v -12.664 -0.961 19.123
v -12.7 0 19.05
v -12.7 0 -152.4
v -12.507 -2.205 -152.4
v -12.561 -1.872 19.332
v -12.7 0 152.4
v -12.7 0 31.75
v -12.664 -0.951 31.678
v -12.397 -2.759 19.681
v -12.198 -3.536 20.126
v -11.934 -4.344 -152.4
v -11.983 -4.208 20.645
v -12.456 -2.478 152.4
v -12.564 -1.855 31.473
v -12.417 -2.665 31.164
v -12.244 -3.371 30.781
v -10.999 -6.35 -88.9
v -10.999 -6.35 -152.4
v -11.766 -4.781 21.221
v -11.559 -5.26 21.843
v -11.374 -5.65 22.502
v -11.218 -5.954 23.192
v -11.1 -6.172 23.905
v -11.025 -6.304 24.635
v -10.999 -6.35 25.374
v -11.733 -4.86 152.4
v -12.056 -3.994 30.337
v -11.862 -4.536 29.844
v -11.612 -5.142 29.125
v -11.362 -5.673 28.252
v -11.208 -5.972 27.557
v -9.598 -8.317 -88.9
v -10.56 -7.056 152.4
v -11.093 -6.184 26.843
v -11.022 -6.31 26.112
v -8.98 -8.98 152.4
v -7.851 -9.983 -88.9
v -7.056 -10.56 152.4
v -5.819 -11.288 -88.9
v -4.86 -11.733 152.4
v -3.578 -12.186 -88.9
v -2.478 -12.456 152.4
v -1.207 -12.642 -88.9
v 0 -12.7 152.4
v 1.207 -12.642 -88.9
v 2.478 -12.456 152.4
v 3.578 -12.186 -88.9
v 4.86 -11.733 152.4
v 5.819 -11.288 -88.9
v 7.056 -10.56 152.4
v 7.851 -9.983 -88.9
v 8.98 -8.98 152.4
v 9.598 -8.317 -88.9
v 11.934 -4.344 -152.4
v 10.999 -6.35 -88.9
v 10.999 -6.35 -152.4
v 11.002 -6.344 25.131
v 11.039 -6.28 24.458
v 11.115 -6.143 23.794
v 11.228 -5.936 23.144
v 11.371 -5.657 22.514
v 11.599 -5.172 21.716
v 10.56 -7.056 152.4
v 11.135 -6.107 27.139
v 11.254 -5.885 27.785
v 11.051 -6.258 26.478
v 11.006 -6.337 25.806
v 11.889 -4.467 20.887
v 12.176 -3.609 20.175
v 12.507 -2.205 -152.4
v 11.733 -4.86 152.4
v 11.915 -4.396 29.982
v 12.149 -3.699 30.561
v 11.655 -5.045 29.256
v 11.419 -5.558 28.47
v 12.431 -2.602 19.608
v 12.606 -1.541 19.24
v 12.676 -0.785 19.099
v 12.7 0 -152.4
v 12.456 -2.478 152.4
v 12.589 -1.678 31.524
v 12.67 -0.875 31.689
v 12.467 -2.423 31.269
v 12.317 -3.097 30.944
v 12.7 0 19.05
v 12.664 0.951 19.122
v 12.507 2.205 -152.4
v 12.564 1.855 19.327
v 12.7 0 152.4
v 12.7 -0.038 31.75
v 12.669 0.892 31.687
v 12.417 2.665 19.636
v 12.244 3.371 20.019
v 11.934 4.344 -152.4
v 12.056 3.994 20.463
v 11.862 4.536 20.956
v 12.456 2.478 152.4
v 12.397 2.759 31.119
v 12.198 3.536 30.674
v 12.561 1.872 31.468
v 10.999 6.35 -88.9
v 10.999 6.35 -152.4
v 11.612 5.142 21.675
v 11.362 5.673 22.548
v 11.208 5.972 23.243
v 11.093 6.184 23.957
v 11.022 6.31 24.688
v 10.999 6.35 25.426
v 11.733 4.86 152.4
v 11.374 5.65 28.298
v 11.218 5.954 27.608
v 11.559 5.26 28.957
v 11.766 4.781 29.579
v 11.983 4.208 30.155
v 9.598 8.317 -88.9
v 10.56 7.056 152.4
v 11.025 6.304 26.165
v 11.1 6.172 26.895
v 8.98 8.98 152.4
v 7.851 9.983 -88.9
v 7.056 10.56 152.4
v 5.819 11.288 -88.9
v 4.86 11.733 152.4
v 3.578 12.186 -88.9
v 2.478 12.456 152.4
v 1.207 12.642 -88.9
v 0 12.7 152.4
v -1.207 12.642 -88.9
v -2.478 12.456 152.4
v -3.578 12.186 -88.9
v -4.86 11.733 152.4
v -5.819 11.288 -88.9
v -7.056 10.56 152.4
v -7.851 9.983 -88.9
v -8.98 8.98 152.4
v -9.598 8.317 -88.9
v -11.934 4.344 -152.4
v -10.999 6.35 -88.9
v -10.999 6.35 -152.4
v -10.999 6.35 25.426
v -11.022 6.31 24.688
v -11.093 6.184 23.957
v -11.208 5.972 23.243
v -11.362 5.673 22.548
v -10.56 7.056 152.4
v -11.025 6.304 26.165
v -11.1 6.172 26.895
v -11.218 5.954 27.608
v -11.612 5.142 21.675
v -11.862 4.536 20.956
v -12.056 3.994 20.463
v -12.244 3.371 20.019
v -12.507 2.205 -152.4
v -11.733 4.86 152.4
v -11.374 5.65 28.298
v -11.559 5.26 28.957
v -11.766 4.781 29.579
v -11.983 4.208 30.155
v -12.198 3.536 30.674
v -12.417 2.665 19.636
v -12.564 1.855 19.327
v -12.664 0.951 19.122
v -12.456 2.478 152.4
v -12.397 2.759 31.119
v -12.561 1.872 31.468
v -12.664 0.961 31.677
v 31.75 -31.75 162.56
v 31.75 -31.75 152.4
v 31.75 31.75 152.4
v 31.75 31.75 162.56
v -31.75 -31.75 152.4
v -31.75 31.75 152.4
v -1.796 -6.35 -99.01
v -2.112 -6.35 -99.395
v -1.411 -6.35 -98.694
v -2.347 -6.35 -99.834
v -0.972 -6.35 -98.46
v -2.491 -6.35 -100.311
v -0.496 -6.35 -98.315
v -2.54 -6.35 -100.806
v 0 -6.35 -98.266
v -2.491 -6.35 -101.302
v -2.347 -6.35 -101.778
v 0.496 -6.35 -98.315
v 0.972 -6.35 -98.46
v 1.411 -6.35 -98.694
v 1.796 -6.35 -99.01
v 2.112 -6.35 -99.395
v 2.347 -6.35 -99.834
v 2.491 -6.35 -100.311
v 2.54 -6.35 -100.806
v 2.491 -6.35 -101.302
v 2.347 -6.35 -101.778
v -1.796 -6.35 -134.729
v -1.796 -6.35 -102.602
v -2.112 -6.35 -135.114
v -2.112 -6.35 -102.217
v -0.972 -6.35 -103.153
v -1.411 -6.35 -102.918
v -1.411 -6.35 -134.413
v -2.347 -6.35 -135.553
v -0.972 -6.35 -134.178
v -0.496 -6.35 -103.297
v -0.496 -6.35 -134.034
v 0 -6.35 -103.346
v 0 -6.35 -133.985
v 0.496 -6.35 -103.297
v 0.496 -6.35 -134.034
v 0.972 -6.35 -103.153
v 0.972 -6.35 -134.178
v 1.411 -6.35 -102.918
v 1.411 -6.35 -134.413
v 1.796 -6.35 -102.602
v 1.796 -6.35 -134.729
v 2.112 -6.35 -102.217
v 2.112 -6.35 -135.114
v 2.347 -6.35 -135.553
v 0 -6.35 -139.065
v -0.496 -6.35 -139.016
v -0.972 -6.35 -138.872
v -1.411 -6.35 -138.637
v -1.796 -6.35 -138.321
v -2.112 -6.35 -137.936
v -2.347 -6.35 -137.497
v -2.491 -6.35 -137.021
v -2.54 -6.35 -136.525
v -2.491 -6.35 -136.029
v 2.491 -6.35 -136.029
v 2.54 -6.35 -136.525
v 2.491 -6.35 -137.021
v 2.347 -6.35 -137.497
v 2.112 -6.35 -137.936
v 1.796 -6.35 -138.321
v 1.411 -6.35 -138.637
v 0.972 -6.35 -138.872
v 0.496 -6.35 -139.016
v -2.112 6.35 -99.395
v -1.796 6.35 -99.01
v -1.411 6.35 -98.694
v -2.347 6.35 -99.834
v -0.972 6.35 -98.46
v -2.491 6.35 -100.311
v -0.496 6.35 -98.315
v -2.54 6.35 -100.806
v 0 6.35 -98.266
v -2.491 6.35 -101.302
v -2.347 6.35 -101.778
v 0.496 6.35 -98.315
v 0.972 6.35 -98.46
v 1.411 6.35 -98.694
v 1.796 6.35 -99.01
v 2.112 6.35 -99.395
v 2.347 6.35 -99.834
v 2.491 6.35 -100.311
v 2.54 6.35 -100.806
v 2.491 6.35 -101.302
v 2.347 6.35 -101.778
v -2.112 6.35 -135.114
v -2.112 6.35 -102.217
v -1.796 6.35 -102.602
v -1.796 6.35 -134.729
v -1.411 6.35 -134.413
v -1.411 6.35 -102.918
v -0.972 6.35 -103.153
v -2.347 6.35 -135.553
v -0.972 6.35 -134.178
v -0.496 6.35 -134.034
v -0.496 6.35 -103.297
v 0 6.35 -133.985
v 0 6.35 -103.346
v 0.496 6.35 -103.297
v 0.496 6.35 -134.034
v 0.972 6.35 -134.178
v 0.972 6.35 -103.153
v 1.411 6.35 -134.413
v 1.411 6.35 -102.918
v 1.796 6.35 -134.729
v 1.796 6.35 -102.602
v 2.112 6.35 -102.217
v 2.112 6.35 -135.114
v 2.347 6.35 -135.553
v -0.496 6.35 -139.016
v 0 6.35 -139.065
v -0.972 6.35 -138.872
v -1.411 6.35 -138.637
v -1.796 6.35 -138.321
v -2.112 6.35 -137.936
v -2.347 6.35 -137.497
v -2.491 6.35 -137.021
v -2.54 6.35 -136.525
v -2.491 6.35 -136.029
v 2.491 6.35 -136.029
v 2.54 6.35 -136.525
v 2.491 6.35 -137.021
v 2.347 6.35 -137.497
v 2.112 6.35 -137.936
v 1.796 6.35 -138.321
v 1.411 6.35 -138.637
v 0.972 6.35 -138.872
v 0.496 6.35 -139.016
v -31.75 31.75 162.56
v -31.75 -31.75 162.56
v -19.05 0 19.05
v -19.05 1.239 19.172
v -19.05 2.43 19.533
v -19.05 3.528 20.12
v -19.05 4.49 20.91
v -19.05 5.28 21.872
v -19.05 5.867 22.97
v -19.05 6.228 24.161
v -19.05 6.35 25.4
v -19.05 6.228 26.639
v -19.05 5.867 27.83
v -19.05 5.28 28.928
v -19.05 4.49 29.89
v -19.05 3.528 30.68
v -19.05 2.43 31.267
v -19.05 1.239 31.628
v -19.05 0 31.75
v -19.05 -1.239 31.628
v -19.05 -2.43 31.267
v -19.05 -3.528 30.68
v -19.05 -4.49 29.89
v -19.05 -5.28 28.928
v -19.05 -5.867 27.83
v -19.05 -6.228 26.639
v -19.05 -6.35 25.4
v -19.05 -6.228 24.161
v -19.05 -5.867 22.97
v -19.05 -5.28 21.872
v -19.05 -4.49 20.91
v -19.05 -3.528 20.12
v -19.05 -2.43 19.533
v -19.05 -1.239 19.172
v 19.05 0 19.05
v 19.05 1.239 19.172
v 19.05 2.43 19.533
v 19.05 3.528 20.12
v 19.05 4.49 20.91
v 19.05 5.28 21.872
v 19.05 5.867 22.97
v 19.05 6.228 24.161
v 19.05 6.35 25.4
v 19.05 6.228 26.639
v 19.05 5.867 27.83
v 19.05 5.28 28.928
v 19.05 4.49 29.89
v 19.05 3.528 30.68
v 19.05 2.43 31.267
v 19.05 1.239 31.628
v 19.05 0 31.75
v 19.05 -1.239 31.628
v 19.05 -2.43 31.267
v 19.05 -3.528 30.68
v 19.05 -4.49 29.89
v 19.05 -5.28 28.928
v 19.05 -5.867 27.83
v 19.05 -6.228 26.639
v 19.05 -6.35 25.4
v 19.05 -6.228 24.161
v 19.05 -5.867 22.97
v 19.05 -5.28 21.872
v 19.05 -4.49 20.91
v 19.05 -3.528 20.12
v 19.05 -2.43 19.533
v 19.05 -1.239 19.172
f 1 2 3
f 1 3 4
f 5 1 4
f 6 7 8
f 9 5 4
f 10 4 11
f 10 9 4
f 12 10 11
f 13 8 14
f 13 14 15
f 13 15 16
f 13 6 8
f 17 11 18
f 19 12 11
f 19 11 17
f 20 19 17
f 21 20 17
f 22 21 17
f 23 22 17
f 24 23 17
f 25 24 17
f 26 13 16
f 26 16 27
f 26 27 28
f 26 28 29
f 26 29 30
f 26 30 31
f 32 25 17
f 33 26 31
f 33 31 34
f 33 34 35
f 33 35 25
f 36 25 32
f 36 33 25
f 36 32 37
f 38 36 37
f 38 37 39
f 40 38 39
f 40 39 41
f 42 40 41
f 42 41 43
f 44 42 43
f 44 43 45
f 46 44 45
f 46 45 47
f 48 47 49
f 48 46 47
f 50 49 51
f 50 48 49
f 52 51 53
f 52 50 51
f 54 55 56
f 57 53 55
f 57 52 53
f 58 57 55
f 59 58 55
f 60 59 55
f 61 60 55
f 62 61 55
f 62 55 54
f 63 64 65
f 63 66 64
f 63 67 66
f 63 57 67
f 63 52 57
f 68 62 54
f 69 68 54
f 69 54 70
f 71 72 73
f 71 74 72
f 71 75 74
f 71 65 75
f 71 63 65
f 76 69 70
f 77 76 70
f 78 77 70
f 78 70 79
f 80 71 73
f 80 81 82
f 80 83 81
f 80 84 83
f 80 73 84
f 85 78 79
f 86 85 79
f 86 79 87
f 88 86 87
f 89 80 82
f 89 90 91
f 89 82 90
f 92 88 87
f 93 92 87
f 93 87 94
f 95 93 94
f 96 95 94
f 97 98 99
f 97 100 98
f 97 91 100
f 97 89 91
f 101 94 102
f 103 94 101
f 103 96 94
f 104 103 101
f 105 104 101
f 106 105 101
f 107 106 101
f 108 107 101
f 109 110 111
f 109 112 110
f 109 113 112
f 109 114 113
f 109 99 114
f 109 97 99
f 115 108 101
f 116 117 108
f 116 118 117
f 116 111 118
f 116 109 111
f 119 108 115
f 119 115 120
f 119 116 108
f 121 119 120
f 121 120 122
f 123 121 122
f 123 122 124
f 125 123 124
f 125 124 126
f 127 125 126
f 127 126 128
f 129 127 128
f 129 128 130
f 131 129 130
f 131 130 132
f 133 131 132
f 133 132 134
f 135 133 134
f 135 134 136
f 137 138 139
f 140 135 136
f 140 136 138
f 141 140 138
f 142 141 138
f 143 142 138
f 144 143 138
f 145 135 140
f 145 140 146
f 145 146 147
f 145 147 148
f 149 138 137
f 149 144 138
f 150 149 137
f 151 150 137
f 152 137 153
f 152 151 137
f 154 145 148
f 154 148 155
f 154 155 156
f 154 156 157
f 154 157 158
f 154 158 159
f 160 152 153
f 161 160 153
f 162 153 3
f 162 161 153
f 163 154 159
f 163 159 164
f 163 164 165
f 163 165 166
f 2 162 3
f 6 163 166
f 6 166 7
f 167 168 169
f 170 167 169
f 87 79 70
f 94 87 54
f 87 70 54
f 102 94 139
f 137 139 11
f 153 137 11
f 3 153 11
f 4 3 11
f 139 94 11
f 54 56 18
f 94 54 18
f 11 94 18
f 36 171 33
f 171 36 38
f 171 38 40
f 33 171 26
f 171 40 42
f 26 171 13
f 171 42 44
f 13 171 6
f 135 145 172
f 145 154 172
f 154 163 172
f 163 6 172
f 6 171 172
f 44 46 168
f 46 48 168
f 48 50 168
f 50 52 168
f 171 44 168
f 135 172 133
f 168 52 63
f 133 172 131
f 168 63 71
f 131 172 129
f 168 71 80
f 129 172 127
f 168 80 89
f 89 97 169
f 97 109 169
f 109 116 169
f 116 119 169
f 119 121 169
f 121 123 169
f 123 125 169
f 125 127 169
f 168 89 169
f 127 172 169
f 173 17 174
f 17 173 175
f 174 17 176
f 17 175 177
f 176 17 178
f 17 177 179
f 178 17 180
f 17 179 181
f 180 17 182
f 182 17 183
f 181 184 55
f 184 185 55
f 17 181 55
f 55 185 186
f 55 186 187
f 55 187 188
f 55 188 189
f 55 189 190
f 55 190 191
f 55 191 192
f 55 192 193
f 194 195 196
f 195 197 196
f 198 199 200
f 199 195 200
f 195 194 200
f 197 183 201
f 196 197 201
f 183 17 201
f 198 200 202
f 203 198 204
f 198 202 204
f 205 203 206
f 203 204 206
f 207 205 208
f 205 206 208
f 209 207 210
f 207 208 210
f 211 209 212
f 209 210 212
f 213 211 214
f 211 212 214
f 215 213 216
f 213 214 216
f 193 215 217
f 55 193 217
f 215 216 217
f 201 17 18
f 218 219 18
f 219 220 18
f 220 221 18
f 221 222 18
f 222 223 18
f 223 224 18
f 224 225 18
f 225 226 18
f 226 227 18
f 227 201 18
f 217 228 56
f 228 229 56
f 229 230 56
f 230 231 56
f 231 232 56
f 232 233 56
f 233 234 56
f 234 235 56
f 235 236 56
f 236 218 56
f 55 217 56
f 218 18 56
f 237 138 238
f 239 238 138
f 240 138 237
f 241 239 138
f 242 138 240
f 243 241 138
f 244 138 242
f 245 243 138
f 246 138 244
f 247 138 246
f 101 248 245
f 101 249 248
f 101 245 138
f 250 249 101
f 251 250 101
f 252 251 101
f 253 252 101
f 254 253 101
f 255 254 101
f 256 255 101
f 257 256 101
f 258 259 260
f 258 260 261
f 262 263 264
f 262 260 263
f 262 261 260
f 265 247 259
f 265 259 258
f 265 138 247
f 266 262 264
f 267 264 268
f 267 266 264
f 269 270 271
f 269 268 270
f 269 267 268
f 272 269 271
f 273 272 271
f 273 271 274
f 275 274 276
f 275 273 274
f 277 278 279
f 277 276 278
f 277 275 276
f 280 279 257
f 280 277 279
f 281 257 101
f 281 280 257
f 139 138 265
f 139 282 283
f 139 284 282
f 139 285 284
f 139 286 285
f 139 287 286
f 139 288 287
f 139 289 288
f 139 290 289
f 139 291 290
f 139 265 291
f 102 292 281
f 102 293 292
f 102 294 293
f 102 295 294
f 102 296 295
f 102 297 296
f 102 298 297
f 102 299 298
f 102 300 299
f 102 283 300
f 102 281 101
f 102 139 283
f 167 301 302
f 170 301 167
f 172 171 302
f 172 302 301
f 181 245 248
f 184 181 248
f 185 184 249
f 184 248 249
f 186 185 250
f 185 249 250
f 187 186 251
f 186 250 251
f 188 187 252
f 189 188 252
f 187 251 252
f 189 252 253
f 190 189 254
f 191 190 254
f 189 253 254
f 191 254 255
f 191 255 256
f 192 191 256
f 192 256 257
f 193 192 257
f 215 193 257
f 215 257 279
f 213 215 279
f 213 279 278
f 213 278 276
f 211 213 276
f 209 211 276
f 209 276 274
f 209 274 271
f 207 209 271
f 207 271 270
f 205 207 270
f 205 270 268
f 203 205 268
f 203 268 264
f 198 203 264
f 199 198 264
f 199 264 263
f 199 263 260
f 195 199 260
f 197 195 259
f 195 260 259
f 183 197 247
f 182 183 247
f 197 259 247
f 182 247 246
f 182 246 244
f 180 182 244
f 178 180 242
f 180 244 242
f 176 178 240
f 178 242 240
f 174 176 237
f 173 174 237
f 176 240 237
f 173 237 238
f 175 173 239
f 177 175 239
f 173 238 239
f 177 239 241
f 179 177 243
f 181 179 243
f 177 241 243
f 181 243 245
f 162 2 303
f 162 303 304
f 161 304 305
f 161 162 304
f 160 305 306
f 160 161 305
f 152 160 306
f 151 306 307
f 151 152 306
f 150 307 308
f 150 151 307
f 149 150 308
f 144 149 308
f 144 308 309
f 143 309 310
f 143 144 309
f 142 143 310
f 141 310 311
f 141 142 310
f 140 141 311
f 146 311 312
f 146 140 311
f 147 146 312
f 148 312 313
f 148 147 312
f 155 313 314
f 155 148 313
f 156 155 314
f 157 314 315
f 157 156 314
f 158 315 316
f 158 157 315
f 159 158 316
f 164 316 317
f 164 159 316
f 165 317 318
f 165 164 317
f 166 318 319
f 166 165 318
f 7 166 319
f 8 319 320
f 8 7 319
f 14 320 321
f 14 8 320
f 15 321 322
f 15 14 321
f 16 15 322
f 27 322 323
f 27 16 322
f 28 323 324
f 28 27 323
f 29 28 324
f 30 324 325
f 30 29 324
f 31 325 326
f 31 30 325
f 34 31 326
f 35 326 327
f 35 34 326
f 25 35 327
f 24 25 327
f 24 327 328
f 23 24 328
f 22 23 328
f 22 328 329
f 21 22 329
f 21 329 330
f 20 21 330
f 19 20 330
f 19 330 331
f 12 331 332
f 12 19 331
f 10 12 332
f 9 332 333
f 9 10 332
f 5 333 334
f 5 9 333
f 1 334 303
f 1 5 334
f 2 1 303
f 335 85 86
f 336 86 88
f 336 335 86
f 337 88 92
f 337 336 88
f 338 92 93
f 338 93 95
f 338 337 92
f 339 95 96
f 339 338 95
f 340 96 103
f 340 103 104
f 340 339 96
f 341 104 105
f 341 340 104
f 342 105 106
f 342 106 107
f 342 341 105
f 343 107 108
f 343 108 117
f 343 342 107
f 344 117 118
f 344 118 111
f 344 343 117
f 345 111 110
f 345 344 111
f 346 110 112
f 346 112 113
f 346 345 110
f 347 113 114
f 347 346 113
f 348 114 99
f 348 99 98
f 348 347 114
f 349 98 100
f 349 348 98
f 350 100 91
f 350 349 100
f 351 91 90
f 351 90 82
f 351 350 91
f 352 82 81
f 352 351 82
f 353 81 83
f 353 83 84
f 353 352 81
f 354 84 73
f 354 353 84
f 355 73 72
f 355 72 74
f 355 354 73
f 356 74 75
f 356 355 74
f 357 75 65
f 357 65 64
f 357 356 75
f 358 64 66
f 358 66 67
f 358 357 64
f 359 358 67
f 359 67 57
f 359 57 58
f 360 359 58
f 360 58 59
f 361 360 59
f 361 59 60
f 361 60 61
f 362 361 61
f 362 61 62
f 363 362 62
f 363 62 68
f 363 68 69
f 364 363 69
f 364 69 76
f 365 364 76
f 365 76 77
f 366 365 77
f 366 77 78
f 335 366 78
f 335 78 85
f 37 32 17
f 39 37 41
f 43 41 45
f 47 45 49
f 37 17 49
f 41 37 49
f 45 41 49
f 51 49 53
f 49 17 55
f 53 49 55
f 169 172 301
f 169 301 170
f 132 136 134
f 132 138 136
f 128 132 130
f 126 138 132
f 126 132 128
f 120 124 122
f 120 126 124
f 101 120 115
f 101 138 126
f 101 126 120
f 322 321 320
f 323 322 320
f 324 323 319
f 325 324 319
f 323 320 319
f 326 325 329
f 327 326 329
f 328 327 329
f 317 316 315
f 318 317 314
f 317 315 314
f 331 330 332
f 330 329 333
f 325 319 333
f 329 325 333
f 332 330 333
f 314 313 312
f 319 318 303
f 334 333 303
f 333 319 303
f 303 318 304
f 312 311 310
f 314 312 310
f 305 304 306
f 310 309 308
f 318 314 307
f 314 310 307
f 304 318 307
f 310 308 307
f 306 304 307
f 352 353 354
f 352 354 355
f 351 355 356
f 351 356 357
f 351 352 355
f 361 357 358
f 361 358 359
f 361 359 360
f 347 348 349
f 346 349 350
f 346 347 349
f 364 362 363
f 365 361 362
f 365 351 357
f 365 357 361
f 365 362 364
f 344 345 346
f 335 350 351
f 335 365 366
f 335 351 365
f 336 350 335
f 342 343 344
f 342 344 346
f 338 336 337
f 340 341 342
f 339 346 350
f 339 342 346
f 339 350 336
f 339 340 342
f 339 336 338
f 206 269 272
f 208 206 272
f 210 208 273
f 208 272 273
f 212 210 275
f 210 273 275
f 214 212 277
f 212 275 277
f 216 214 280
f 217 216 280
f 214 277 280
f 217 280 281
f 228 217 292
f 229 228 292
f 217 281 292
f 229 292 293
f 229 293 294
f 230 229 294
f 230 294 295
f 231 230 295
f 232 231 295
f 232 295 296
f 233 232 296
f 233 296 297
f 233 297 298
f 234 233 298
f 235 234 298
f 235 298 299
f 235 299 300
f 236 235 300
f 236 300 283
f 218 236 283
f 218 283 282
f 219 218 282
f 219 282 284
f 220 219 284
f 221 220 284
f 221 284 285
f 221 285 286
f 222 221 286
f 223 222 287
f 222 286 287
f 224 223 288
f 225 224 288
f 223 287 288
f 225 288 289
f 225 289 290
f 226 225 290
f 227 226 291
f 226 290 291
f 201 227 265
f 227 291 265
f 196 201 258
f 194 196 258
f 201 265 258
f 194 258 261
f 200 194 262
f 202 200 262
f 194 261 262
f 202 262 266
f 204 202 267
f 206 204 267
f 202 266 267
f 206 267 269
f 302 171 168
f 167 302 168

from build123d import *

# Parameters (mm, degrees)
SKETCH1_R           = 12.7
BOSS_EXTRUDE3_DEPTH = 152.4
SKETCH12_W          = 63.5
SKETCH12_H          = 63.5
BOSS_EXTRUDE5_DEPTH = 10.16
SKETCH9_R           = 6.35
BOSS_EXTRUDE6_DEPTH = 19.05
SKETCH16_W          = 25.4
SKETCH16_H          = 63.5
CUT_EXTRUDE2_DEPTH  = 170.957130183
SKETCH17_W          = 25.4
SKETCH17_H          = 63.5
CUT_EXTRUDE3_DEPTH  = 170.957130183
SKETCH19_R          = 2.54
CUT_EXTRUDE5_DEPTH  = 170.957130183


with BuildPart() as part:
    # Sketch1 → Boss-Extrude3 (new, symmetric)
    with BuildSketch(Plane.XY):
        with Locations(Location((0, 0, 0), (0, 0, 180))):
            Circle(SKETCH1_R)
    extrude(amount=BOSS_EXTRUDE3_DEPTH, both=True)

    # Sketch12 → Boss-Extrude5 (add)
    with BuildSketch(Plane.XY.offset(152.4)):
        Rectangle(SKETCH12_W, SKETCH12_H)
    extrude(amount=BOSS_EXTRUDE5_DEPTH)

    # Sketch9 → Boss-Extrude6 (add, symmetric)
    with BuildSketch(Plane(origin=(0, 0, 0), x_dir=(0, 0, -1), z_dir=(1, 0, 0))):
        with Locations((-25.4, 0)):
            Circle(SKETCH9_R)
    extrude(amount=BOSS_EXTRUDE6_DEPTH, both=True)

    # Sketch16 → Cut-Extrude2 (cut, through all)
    with BuildSketch(Plane(origin=(0, -6.35, 0), x_dir=(1, 0, 0), z_dir=(0, 1, 0))):
        with Locations((0, 120.65)):
            Rectangle(SKETCH16_W, SKETCH16_H)
    extrude(amount=-CUT_EXTRUDE2_DEPTH, mode=Mode.SUBTRACT)

    # Sketch17 → Cut-Extrude3 (cut, through all)
    with BuildSketch(Plane(origin=(0, 6.35, 0), x_dir=(1, 0, 0), z_dir=(0, 1, 0))):
        with Locations((0, 120.65)):
            Rectangle(SKETCH17_W, SKETCH17_H)
    extrude(amount=CUT_EXTRUDE3_DEPTH, mode=Mode.SUBTRACT)

    # Sketch19 → Cut-Extrude5 (cut, through all)
    with BuildSketch(Plane(origin=(0, 6.35, 0), x_dir=(1, 0, 0), z_dir=(0, 1, 0))):
        with Locations(Location((0, 100.80625, 0), (0, 0, 270))):
            Circle(SKETCH19_R)
        with Locations(Location((0, 136.525, 0), (0, 0, 270))):
            Circle(SKETCH19_R)
    extrude(amount=-CUT_EXTRUDE5_DEPTH, mode=Mode.SUBTRACT)


solid = part.part
